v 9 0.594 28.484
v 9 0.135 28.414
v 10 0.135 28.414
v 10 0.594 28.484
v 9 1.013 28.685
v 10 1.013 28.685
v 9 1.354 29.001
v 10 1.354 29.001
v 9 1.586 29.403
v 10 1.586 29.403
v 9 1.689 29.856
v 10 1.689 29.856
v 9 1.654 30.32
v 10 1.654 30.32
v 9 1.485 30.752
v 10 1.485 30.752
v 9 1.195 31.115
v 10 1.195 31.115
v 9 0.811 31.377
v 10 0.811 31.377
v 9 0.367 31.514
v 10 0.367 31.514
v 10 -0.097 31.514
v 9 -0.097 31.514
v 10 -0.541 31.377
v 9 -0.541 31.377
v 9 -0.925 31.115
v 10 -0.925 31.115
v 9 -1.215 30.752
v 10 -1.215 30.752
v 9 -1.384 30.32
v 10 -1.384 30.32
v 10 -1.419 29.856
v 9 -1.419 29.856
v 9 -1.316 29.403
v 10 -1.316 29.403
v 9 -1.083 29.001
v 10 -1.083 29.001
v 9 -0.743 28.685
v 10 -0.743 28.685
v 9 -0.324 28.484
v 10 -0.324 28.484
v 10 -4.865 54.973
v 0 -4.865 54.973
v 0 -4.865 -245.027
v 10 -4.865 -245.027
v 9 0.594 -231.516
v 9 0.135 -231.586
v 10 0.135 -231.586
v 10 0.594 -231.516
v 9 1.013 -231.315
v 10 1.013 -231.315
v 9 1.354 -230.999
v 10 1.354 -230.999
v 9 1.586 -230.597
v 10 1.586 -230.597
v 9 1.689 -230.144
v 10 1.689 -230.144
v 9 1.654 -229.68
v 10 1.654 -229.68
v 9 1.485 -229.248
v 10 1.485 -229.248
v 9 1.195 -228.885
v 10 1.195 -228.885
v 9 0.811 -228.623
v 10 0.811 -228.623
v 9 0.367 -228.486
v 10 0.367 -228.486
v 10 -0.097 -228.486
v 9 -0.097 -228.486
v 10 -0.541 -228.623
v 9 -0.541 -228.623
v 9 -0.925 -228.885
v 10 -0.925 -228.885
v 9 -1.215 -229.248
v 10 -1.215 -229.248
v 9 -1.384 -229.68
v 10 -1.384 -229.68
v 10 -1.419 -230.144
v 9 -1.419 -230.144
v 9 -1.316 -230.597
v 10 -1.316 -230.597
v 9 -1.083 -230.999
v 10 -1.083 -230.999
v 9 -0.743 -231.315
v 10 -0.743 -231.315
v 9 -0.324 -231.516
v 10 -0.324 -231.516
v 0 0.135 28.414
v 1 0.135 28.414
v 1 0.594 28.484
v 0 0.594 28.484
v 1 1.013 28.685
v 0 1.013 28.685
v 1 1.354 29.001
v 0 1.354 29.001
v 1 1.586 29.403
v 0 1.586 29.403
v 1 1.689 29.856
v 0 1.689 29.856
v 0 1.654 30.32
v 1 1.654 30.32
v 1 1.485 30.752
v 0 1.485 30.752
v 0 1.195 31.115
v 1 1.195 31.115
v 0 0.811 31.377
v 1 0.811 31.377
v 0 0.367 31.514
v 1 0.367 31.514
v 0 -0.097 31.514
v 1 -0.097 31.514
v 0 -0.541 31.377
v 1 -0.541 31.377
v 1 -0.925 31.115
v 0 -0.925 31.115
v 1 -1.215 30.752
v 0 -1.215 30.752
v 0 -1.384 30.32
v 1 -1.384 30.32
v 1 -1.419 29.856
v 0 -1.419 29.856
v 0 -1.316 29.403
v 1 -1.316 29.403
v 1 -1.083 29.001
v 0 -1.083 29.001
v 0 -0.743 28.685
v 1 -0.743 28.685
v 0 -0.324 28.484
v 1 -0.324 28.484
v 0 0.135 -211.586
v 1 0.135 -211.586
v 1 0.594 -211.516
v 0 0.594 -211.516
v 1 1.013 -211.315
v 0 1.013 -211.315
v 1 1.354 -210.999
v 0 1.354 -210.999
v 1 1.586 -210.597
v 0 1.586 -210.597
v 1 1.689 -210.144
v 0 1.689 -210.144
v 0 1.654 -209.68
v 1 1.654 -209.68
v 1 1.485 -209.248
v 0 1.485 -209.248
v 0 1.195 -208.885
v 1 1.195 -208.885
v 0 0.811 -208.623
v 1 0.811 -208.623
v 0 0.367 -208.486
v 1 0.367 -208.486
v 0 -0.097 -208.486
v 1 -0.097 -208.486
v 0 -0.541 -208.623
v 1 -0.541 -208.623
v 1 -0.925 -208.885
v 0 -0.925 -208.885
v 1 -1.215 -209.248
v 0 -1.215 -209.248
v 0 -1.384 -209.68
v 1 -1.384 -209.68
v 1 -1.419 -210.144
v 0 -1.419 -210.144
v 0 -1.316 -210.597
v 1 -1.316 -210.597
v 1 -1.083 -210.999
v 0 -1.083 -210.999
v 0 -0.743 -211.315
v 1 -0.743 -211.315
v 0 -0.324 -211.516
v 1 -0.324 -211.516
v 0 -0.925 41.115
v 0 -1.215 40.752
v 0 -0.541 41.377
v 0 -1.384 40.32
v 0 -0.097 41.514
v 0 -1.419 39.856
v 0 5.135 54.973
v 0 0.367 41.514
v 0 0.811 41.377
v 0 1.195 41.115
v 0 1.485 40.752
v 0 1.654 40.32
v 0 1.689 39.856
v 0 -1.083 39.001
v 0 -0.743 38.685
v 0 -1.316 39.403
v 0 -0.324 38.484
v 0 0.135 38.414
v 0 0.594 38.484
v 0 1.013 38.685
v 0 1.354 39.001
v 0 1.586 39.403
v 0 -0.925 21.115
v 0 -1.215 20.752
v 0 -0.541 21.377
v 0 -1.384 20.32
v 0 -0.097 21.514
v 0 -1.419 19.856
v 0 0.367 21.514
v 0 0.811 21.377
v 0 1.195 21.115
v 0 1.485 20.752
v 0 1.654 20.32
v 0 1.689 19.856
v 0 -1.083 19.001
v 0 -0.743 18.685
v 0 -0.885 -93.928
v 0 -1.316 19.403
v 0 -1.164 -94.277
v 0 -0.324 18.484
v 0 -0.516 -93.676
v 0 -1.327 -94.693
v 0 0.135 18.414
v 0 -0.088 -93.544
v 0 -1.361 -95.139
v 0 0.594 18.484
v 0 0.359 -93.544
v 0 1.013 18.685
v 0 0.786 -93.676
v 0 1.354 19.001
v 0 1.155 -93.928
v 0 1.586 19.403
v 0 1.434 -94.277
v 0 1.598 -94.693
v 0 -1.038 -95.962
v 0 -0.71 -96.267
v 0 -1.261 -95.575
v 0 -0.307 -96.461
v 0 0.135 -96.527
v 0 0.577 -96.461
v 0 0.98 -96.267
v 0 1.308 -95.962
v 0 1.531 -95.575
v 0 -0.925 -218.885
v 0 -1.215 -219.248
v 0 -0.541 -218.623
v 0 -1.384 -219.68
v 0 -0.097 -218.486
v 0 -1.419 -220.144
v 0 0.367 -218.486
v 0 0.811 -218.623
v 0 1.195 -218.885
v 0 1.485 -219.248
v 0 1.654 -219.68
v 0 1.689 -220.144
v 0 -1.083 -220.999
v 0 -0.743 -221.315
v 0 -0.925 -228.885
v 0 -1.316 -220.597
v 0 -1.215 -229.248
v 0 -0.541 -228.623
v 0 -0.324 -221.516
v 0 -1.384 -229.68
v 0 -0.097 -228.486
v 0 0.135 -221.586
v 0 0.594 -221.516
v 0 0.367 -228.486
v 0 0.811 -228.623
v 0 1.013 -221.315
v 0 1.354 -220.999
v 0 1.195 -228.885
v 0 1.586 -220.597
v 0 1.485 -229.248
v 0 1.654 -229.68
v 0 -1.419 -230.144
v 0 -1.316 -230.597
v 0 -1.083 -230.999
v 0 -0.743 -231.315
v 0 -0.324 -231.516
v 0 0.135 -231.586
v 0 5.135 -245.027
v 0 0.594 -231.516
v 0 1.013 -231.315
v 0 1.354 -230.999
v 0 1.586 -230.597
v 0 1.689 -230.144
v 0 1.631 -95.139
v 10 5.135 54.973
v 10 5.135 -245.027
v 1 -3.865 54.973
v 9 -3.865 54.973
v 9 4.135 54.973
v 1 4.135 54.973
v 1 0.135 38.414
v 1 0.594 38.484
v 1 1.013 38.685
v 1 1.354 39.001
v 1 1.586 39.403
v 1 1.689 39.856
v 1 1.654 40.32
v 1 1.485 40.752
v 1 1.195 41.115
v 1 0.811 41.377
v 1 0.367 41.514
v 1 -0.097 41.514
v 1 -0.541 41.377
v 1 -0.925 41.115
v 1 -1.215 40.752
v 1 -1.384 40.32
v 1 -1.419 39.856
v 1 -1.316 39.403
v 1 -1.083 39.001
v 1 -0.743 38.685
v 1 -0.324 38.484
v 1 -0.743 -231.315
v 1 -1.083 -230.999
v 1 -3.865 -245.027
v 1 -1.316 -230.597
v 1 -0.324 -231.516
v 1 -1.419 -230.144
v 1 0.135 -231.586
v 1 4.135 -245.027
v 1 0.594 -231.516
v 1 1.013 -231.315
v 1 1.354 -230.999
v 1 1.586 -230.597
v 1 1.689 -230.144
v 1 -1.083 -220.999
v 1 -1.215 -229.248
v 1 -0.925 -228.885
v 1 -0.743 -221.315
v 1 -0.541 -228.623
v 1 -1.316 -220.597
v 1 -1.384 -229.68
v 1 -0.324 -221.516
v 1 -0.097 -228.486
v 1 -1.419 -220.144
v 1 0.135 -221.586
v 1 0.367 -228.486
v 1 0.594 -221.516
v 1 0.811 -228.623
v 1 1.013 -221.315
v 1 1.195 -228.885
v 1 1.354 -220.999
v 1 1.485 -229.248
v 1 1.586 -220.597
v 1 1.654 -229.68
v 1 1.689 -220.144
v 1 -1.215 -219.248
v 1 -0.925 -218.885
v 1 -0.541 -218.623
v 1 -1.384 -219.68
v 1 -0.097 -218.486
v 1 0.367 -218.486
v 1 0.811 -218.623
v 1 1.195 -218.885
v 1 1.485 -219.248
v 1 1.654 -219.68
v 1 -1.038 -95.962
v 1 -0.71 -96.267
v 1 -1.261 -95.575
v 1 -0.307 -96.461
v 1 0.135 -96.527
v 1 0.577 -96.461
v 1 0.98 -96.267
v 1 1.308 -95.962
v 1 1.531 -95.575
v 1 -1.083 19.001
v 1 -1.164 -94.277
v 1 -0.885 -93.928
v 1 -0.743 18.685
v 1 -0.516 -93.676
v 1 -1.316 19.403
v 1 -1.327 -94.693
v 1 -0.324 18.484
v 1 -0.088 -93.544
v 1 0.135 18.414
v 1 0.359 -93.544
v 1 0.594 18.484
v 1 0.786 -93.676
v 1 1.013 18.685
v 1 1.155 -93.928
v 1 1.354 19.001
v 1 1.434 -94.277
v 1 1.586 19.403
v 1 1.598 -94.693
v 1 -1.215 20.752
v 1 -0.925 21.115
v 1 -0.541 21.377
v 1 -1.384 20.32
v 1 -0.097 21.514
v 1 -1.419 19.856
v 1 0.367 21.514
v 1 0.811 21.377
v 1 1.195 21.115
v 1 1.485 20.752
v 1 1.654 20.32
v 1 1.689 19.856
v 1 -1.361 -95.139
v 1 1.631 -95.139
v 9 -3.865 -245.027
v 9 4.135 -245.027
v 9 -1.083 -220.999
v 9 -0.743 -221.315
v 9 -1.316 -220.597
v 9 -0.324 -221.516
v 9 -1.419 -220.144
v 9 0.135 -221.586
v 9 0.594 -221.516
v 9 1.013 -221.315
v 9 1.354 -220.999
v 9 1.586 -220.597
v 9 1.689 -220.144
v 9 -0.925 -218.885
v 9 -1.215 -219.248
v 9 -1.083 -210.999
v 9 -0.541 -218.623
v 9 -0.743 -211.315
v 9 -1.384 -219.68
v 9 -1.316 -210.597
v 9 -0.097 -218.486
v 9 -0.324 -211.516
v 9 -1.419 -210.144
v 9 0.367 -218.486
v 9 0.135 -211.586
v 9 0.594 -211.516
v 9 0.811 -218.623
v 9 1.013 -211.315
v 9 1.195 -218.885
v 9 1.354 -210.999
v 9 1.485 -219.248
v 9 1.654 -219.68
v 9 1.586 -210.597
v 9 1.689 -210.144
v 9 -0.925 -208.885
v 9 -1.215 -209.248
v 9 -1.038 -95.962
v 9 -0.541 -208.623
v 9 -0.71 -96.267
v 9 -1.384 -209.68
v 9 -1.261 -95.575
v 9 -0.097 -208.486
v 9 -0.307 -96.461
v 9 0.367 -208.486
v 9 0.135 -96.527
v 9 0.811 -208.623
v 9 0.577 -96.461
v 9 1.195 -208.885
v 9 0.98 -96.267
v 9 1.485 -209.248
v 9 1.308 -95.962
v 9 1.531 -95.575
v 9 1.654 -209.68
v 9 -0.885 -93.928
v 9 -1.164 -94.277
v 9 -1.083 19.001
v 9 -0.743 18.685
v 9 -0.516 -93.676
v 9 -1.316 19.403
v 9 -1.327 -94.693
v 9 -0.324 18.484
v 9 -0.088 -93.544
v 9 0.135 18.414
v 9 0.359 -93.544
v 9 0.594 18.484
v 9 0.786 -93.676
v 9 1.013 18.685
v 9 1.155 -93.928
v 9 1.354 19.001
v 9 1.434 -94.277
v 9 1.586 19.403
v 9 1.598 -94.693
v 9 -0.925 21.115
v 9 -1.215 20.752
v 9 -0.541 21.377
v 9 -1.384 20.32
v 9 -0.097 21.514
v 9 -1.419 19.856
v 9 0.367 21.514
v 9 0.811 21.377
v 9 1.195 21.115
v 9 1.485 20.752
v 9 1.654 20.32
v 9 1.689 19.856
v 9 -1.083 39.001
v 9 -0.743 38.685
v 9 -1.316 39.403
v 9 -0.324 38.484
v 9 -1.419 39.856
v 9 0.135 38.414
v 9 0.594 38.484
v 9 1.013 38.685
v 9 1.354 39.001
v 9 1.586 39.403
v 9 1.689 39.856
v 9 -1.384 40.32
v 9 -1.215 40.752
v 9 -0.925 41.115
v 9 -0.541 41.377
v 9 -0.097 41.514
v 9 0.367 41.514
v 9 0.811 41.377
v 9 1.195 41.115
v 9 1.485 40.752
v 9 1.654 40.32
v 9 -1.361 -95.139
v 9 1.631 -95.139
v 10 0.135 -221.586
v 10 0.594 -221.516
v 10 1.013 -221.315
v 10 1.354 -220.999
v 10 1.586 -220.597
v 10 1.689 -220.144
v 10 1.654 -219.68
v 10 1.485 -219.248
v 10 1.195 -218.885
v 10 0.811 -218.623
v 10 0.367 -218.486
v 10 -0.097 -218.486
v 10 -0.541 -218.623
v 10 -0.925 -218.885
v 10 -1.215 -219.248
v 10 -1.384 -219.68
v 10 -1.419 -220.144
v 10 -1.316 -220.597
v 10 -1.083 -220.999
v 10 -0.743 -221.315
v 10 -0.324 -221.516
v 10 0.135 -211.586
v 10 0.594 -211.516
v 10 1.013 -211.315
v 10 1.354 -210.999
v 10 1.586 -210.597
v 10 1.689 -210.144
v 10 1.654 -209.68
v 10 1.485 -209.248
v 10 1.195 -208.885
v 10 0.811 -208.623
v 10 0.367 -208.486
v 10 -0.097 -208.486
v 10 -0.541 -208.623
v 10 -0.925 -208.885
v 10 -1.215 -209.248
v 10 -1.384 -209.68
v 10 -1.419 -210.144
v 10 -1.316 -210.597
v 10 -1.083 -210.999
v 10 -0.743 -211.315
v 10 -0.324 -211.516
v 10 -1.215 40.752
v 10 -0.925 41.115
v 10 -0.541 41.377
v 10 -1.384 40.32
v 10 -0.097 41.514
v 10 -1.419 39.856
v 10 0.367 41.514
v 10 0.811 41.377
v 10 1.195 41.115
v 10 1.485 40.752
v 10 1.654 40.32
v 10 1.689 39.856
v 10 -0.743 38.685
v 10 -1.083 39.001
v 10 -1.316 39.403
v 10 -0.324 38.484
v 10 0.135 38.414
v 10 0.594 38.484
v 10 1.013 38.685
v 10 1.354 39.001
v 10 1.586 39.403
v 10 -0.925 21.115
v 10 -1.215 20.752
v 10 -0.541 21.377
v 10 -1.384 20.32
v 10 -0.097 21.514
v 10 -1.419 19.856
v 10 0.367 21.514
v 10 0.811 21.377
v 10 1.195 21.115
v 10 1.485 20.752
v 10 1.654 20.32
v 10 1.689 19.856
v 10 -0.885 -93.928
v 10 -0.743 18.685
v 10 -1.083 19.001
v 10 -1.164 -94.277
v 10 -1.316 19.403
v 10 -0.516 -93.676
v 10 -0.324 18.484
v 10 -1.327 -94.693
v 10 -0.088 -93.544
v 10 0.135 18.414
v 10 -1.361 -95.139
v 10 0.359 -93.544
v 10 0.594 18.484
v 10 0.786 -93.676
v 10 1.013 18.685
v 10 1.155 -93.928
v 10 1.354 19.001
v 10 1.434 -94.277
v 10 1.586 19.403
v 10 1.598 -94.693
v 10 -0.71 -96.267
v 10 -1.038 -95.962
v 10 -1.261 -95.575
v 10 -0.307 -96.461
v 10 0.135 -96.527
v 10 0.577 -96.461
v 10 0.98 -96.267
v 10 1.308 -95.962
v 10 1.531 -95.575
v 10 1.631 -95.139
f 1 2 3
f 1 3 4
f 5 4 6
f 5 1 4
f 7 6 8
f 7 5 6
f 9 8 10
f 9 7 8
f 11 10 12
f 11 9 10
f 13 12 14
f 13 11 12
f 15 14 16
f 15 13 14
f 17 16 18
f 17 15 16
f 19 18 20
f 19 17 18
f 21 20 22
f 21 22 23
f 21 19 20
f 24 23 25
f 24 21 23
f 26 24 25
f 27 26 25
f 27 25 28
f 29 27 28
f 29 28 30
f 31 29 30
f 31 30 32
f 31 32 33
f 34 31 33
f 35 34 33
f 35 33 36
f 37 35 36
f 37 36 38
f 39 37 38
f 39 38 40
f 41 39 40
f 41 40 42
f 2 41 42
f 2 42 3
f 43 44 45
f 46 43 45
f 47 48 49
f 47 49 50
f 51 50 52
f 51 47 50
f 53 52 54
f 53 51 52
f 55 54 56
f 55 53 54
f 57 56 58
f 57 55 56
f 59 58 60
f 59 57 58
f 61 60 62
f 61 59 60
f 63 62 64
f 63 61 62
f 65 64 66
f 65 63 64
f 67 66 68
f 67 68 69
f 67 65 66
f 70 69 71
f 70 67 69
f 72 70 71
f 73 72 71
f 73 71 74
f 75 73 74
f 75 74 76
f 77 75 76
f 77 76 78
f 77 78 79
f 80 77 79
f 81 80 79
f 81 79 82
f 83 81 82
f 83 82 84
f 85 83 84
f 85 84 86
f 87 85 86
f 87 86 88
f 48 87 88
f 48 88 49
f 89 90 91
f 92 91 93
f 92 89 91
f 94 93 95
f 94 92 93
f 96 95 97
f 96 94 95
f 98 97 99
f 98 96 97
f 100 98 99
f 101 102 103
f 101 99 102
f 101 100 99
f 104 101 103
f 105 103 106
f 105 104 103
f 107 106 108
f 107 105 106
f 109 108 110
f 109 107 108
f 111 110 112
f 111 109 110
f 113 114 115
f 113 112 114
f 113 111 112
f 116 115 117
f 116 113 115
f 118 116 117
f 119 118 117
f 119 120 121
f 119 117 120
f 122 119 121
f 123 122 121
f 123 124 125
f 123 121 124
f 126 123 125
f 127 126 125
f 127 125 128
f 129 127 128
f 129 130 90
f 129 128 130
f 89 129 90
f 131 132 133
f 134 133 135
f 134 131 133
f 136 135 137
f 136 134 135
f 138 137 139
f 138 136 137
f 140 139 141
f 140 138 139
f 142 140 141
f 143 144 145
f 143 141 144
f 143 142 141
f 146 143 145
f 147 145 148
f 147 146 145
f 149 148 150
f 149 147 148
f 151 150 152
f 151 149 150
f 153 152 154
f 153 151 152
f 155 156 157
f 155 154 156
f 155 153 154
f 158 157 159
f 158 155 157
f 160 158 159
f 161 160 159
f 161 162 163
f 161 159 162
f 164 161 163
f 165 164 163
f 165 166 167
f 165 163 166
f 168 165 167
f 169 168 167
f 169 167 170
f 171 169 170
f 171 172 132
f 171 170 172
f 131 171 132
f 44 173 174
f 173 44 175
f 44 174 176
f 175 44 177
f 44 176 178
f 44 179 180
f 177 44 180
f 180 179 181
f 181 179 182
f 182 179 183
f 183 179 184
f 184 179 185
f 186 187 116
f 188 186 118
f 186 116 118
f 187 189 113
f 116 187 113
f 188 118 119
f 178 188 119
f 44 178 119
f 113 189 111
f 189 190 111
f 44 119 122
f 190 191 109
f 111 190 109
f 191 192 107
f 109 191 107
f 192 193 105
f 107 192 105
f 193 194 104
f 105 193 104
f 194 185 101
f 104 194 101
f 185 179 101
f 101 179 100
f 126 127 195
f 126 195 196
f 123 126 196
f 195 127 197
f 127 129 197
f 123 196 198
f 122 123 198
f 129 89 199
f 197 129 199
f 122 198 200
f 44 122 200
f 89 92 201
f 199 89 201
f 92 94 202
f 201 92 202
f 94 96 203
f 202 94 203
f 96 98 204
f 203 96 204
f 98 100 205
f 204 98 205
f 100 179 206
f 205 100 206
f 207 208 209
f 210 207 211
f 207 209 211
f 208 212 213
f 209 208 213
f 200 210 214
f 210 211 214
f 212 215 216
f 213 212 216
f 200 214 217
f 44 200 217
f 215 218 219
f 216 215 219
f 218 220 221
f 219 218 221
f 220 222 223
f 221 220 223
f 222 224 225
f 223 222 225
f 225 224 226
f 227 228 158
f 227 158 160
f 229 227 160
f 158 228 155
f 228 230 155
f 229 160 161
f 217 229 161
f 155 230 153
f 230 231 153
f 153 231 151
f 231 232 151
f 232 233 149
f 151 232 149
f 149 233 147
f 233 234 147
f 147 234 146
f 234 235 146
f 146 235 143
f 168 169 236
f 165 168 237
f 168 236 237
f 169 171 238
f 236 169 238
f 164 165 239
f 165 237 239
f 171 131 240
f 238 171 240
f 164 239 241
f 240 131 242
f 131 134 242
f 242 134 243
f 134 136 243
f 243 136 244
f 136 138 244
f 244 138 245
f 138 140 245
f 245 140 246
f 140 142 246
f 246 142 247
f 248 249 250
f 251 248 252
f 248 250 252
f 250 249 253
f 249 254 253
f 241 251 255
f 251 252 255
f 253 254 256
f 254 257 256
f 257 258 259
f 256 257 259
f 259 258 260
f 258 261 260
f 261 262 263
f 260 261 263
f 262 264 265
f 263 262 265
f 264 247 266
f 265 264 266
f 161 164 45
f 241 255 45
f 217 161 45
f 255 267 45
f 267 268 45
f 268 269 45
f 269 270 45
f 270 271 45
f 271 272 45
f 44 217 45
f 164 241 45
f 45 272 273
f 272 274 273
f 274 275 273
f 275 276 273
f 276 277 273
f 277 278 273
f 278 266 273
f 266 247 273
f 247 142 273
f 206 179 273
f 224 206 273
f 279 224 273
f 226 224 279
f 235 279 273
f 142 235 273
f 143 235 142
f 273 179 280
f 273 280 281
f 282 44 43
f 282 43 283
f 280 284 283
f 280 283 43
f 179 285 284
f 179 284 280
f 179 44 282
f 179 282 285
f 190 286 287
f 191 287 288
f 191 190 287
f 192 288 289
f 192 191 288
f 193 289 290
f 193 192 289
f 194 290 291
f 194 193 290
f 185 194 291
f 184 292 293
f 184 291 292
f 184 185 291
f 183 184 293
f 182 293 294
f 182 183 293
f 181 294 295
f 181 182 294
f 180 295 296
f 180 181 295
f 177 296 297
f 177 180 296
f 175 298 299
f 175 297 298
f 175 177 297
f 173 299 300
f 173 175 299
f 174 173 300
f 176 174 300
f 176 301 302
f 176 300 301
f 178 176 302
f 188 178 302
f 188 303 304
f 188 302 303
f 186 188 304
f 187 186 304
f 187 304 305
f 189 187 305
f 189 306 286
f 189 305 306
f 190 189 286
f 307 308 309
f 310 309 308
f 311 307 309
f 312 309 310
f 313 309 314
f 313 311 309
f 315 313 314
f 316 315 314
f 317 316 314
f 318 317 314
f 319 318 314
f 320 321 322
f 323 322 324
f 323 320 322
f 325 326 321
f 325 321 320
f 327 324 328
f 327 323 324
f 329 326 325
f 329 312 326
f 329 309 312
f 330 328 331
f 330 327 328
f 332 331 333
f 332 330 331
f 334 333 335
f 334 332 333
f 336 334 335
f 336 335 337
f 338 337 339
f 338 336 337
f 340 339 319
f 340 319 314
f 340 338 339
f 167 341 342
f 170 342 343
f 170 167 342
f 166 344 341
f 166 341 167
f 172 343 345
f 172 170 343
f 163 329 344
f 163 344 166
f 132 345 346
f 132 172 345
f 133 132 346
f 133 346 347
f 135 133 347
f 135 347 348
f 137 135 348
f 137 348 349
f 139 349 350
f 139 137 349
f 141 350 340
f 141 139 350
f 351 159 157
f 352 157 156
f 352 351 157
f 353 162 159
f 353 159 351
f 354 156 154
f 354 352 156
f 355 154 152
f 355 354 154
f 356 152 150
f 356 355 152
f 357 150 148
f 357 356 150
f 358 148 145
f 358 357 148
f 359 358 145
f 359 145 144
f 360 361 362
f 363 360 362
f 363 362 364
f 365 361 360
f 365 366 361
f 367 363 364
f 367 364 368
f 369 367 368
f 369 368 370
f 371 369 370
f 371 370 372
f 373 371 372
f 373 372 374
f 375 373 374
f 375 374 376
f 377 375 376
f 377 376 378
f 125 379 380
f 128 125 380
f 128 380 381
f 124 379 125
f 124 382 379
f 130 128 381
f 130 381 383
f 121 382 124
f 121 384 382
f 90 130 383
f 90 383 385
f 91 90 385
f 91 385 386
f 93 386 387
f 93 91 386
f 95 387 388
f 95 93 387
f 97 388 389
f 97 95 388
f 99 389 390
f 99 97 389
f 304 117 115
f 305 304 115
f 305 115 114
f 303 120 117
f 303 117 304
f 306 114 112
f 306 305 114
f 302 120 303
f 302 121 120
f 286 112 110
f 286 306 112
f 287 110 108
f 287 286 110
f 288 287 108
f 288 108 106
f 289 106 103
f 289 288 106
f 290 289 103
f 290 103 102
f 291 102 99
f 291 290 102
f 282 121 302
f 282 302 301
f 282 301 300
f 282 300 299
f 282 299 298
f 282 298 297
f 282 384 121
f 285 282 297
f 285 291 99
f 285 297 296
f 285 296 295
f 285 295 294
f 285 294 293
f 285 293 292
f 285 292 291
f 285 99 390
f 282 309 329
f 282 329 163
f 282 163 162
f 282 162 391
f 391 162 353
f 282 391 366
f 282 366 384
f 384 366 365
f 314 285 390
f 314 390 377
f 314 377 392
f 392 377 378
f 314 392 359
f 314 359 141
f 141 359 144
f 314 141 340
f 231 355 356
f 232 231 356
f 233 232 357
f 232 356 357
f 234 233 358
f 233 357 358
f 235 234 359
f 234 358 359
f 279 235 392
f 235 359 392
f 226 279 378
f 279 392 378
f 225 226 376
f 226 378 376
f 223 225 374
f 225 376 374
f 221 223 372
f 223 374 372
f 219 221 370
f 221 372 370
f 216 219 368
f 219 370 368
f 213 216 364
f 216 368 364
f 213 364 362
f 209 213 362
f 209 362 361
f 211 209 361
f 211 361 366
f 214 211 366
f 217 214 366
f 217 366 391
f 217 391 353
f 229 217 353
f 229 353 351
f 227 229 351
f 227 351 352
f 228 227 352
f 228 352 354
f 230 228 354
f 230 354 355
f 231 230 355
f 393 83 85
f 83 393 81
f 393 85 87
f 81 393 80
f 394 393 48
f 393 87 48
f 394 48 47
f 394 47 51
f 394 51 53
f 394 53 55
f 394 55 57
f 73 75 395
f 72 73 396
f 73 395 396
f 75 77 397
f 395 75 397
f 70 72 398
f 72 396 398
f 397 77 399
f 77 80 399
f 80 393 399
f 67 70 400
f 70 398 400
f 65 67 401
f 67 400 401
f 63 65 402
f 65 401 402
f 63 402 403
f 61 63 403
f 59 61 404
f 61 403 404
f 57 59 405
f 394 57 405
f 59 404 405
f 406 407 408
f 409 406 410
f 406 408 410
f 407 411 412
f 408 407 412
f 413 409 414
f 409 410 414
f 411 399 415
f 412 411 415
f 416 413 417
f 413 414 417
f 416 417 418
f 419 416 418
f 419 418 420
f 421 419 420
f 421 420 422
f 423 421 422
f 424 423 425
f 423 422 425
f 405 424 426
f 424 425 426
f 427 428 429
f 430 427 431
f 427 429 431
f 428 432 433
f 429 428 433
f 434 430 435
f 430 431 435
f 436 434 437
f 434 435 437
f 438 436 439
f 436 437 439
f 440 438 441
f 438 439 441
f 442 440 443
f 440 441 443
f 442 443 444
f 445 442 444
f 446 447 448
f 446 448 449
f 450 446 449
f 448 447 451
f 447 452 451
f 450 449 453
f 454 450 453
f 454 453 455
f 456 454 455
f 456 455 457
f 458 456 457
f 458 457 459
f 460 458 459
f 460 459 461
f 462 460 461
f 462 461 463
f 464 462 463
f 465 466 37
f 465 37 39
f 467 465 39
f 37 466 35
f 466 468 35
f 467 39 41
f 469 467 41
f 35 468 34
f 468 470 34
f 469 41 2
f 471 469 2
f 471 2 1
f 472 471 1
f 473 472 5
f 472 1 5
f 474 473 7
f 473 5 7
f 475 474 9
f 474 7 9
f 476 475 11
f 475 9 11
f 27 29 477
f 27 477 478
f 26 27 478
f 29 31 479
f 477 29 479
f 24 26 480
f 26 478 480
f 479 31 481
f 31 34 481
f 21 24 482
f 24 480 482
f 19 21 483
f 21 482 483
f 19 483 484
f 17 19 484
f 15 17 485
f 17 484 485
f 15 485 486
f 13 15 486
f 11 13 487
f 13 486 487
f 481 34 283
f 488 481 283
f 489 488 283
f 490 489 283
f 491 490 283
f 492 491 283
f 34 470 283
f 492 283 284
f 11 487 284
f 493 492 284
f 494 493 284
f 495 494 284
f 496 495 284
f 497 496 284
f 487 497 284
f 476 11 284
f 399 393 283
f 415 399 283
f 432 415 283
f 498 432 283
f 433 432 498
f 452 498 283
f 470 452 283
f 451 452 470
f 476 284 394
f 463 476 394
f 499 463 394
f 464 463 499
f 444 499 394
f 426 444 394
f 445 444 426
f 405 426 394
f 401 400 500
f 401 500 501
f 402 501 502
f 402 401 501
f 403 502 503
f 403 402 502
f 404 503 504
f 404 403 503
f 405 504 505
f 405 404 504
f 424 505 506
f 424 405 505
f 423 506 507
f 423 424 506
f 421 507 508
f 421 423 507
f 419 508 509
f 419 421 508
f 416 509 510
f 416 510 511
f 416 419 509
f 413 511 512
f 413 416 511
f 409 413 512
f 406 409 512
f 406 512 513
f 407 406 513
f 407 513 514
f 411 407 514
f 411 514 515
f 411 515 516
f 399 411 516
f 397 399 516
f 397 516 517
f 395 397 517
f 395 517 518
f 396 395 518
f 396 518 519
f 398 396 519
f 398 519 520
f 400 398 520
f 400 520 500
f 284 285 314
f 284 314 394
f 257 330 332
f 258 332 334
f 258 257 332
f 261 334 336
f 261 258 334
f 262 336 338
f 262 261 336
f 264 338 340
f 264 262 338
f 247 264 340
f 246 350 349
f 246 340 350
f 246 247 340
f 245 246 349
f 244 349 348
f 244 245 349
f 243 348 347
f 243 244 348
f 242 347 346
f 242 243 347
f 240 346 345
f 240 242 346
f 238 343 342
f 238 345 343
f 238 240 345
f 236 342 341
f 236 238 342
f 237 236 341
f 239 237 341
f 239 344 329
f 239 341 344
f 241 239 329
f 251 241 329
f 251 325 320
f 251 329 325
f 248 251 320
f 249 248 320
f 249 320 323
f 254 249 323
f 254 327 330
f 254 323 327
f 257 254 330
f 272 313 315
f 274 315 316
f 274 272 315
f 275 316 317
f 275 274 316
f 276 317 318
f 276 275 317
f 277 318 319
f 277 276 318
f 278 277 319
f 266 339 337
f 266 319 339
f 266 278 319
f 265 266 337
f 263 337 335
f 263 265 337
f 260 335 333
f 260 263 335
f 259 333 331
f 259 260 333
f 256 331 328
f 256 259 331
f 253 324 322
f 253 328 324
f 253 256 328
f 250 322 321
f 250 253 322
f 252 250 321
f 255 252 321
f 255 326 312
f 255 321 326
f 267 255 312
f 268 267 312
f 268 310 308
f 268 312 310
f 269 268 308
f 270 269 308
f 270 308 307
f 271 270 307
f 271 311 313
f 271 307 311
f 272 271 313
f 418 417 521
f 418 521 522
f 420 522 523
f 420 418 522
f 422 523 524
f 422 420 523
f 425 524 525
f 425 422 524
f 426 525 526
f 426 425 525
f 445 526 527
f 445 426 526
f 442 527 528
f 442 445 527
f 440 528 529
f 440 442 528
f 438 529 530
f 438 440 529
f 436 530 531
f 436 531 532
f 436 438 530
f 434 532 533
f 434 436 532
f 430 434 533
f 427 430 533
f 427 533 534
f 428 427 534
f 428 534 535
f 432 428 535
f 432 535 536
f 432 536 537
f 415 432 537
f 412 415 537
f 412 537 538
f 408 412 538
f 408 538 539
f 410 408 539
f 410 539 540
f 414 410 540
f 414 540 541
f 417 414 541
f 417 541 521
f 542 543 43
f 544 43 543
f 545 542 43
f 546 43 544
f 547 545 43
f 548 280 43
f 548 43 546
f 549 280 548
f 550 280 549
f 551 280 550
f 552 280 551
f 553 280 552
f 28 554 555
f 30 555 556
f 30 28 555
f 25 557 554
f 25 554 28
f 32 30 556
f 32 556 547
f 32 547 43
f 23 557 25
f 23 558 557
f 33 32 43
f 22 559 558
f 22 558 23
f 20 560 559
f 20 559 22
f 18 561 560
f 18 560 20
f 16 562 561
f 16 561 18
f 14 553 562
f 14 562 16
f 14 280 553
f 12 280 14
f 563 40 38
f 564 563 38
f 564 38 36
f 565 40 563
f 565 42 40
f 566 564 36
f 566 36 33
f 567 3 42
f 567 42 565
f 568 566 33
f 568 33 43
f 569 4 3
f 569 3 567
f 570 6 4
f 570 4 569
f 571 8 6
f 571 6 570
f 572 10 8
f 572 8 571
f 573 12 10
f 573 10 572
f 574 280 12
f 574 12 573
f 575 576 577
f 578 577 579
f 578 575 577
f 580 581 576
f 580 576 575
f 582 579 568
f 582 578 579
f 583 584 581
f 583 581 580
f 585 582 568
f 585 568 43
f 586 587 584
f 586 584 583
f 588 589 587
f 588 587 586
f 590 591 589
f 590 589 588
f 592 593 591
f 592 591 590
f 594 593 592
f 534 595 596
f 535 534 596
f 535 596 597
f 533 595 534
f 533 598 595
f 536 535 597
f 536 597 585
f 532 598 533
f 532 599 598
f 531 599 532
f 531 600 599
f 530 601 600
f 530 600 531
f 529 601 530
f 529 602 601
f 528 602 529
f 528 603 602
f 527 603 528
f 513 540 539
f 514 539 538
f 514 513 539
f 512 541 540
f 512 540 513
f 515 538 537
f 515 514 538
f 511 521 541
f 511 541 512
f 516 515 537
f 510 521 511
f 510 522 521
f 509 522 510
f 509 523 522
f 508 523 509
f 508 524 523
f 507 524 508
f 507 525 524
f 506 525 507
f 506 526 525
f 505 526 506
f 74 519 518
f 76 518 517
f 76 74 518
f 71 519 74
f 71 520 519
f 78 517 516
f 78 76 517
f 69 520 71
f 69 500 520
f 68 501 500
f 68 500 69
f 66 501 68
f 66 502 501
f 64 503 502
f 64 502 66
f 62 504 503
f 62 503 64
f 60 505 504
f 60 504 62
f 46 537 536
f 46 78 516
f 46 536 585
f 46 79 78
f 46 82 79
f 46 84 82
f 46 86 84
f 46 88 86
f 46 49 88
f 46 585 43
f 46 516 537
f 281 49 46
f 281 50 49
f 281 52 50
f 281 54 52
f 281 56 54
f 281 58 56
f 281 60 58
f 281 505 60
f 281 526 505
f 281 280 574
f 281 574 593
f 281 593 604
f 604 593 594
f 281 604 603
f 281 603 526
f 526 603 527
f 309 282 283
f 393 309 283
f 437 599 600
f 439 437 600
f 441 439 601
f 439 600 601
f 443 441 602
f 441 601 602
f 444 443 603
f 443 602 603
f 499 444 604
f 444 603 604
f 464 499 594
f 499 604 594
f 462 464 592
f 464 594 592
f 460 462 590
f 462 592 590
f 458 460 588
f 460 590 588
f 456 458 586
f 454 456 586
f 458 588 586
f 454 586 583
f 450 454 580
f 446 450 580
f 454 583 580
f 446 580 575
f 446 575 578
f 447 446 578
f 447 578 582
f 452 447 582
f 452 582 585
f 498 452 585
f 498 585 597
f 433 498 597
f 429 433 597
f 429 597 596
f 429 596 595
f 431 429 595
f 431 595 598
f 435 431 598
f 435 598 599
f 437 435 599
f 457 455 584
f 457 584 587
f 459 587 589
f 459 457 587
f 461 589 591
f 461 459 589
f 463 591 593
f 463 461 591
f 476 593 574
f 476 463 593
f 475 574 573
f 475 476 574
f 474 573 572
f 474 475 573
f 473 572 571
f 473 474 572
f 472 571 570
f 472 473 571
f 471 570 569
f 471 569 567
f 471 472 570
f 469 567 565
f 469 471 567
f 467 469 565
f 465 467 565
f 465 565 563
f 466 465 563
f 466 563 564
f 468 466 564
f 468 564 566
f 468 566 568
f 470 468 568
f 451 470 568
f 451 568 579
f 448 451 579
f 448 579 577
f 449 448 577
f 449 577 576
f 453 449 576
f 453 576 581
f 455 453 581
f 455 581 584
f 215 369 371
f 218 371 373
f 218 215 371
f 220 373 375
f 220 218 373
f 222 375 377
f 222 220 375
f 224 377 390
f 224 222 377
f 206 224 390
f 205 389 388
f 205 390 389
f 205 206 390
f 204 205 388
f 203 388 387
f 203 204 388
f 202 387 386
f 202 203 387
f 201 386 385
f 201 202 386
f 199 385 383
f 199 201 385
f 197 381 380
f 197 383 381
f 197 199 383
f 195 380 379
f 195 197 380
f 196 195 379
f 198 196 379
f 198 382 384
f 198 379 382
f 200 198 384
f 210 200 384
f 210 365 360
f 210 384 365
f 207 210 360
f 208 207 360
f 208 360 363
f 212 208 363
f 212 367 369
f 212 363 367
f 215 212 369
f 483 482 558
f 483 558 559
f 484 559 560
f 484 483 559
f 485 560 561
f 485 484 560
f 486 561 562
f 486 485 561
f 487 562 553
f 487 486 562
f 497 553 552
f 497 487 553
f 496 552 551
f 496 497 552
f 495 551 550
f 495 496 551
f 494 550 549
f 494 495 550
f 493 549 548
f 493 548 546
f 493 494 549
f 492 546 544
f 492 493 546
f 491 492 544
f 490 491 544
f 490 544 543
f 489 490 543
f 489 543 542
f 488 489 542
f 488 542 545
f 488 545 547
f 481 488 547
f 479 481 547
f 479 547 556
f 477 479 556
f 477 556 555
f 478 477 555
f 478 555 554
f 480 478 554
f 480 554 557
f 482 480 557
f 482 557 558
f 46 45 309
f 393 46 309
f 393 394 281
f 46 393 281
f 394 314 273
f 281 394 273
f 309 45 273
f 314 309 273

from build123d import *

# Parameters (mm, degrees)
SKETCH_1_W          = 300
SKETCH_1_H          = 10
SKETCH_1_R          = 1.558433933
EXTRUDE_4_DEPTH     = 10
SKETCH_5_R          = 1.5
CUT_EXTRUDE_1_DEPTH = 10
SKETCH_9_W          = 8
SKETCH_9_H          = 8
CUT_EXTRUDE_4_DEPTH = 300


with BuildPart() as part:
    # 草图1 → 凸台-拉伸4 (new body)
    with BuildSketch(Plane(origin=(0, 0, 0), x_dir=(0, 0, -1), z_dir=(1, 0, 0))):
        with Locations((95.027173063, 0.135119806)):
            Rectangle(SKETCH_1_W, SKETCH_1_H)
        with Locations((-39.972826937, 0.135119806)):
            Circle(SKETCH_1_R, mode=Mode.SUBTRACT)
        with Locations((-29.972826937, 0.135119806)):
            Circle(SKETCH_1_R, mode=Mode.SUBTRACT)
        with Locations((-19.972826937, 0.135119806)):
            Circle(SKETCH_1_R, mode=Mode.SUBTRACT)
        with Locations((210.027173063, 0.135119806)):
            Circle(SKETCH_1_R, mode=Mode.SUBTRACT)
        with Locations((220.027173063, 0.135119806)):
            Circle(SKETCH_1_R, mode=Mode.SUBTRACT)
        with Locations((230.027173063, 0.135119806)):
            Circle(SKETCH_1_R, mode=Mode.SUBTRACT)
    extrude(amount=EXTRUDE_4_DEPTH)

    # 草图5 → 切除-拉伸1 (cut)
    with BuildSketch(Plane(origin=(10, 0, 0), x_dir=(0, 0, -1), z_dir=(1, 0, 0))):
        with Locations((95.027173063, 0.135119806)):
            Circle(SKETCH_5_R)
    extrude(amount=-CUT_EXTRUDE_1_DEPTH, mode=Mode.SUBTRACT)

    # 草图9 → 切除-拉伸4 (cut)
    with BuildSketch(Plane.XY.offset(54.972826937)):
        with Locations((5, 0.135119806)):
            Rectangle(SKETCH_9_W, SKETCH_9_H)
    extrude(amount=-CUT_EXTRUDE_4_DEPTH, mode=Mode.SUBTRACT)


solid = part.part
